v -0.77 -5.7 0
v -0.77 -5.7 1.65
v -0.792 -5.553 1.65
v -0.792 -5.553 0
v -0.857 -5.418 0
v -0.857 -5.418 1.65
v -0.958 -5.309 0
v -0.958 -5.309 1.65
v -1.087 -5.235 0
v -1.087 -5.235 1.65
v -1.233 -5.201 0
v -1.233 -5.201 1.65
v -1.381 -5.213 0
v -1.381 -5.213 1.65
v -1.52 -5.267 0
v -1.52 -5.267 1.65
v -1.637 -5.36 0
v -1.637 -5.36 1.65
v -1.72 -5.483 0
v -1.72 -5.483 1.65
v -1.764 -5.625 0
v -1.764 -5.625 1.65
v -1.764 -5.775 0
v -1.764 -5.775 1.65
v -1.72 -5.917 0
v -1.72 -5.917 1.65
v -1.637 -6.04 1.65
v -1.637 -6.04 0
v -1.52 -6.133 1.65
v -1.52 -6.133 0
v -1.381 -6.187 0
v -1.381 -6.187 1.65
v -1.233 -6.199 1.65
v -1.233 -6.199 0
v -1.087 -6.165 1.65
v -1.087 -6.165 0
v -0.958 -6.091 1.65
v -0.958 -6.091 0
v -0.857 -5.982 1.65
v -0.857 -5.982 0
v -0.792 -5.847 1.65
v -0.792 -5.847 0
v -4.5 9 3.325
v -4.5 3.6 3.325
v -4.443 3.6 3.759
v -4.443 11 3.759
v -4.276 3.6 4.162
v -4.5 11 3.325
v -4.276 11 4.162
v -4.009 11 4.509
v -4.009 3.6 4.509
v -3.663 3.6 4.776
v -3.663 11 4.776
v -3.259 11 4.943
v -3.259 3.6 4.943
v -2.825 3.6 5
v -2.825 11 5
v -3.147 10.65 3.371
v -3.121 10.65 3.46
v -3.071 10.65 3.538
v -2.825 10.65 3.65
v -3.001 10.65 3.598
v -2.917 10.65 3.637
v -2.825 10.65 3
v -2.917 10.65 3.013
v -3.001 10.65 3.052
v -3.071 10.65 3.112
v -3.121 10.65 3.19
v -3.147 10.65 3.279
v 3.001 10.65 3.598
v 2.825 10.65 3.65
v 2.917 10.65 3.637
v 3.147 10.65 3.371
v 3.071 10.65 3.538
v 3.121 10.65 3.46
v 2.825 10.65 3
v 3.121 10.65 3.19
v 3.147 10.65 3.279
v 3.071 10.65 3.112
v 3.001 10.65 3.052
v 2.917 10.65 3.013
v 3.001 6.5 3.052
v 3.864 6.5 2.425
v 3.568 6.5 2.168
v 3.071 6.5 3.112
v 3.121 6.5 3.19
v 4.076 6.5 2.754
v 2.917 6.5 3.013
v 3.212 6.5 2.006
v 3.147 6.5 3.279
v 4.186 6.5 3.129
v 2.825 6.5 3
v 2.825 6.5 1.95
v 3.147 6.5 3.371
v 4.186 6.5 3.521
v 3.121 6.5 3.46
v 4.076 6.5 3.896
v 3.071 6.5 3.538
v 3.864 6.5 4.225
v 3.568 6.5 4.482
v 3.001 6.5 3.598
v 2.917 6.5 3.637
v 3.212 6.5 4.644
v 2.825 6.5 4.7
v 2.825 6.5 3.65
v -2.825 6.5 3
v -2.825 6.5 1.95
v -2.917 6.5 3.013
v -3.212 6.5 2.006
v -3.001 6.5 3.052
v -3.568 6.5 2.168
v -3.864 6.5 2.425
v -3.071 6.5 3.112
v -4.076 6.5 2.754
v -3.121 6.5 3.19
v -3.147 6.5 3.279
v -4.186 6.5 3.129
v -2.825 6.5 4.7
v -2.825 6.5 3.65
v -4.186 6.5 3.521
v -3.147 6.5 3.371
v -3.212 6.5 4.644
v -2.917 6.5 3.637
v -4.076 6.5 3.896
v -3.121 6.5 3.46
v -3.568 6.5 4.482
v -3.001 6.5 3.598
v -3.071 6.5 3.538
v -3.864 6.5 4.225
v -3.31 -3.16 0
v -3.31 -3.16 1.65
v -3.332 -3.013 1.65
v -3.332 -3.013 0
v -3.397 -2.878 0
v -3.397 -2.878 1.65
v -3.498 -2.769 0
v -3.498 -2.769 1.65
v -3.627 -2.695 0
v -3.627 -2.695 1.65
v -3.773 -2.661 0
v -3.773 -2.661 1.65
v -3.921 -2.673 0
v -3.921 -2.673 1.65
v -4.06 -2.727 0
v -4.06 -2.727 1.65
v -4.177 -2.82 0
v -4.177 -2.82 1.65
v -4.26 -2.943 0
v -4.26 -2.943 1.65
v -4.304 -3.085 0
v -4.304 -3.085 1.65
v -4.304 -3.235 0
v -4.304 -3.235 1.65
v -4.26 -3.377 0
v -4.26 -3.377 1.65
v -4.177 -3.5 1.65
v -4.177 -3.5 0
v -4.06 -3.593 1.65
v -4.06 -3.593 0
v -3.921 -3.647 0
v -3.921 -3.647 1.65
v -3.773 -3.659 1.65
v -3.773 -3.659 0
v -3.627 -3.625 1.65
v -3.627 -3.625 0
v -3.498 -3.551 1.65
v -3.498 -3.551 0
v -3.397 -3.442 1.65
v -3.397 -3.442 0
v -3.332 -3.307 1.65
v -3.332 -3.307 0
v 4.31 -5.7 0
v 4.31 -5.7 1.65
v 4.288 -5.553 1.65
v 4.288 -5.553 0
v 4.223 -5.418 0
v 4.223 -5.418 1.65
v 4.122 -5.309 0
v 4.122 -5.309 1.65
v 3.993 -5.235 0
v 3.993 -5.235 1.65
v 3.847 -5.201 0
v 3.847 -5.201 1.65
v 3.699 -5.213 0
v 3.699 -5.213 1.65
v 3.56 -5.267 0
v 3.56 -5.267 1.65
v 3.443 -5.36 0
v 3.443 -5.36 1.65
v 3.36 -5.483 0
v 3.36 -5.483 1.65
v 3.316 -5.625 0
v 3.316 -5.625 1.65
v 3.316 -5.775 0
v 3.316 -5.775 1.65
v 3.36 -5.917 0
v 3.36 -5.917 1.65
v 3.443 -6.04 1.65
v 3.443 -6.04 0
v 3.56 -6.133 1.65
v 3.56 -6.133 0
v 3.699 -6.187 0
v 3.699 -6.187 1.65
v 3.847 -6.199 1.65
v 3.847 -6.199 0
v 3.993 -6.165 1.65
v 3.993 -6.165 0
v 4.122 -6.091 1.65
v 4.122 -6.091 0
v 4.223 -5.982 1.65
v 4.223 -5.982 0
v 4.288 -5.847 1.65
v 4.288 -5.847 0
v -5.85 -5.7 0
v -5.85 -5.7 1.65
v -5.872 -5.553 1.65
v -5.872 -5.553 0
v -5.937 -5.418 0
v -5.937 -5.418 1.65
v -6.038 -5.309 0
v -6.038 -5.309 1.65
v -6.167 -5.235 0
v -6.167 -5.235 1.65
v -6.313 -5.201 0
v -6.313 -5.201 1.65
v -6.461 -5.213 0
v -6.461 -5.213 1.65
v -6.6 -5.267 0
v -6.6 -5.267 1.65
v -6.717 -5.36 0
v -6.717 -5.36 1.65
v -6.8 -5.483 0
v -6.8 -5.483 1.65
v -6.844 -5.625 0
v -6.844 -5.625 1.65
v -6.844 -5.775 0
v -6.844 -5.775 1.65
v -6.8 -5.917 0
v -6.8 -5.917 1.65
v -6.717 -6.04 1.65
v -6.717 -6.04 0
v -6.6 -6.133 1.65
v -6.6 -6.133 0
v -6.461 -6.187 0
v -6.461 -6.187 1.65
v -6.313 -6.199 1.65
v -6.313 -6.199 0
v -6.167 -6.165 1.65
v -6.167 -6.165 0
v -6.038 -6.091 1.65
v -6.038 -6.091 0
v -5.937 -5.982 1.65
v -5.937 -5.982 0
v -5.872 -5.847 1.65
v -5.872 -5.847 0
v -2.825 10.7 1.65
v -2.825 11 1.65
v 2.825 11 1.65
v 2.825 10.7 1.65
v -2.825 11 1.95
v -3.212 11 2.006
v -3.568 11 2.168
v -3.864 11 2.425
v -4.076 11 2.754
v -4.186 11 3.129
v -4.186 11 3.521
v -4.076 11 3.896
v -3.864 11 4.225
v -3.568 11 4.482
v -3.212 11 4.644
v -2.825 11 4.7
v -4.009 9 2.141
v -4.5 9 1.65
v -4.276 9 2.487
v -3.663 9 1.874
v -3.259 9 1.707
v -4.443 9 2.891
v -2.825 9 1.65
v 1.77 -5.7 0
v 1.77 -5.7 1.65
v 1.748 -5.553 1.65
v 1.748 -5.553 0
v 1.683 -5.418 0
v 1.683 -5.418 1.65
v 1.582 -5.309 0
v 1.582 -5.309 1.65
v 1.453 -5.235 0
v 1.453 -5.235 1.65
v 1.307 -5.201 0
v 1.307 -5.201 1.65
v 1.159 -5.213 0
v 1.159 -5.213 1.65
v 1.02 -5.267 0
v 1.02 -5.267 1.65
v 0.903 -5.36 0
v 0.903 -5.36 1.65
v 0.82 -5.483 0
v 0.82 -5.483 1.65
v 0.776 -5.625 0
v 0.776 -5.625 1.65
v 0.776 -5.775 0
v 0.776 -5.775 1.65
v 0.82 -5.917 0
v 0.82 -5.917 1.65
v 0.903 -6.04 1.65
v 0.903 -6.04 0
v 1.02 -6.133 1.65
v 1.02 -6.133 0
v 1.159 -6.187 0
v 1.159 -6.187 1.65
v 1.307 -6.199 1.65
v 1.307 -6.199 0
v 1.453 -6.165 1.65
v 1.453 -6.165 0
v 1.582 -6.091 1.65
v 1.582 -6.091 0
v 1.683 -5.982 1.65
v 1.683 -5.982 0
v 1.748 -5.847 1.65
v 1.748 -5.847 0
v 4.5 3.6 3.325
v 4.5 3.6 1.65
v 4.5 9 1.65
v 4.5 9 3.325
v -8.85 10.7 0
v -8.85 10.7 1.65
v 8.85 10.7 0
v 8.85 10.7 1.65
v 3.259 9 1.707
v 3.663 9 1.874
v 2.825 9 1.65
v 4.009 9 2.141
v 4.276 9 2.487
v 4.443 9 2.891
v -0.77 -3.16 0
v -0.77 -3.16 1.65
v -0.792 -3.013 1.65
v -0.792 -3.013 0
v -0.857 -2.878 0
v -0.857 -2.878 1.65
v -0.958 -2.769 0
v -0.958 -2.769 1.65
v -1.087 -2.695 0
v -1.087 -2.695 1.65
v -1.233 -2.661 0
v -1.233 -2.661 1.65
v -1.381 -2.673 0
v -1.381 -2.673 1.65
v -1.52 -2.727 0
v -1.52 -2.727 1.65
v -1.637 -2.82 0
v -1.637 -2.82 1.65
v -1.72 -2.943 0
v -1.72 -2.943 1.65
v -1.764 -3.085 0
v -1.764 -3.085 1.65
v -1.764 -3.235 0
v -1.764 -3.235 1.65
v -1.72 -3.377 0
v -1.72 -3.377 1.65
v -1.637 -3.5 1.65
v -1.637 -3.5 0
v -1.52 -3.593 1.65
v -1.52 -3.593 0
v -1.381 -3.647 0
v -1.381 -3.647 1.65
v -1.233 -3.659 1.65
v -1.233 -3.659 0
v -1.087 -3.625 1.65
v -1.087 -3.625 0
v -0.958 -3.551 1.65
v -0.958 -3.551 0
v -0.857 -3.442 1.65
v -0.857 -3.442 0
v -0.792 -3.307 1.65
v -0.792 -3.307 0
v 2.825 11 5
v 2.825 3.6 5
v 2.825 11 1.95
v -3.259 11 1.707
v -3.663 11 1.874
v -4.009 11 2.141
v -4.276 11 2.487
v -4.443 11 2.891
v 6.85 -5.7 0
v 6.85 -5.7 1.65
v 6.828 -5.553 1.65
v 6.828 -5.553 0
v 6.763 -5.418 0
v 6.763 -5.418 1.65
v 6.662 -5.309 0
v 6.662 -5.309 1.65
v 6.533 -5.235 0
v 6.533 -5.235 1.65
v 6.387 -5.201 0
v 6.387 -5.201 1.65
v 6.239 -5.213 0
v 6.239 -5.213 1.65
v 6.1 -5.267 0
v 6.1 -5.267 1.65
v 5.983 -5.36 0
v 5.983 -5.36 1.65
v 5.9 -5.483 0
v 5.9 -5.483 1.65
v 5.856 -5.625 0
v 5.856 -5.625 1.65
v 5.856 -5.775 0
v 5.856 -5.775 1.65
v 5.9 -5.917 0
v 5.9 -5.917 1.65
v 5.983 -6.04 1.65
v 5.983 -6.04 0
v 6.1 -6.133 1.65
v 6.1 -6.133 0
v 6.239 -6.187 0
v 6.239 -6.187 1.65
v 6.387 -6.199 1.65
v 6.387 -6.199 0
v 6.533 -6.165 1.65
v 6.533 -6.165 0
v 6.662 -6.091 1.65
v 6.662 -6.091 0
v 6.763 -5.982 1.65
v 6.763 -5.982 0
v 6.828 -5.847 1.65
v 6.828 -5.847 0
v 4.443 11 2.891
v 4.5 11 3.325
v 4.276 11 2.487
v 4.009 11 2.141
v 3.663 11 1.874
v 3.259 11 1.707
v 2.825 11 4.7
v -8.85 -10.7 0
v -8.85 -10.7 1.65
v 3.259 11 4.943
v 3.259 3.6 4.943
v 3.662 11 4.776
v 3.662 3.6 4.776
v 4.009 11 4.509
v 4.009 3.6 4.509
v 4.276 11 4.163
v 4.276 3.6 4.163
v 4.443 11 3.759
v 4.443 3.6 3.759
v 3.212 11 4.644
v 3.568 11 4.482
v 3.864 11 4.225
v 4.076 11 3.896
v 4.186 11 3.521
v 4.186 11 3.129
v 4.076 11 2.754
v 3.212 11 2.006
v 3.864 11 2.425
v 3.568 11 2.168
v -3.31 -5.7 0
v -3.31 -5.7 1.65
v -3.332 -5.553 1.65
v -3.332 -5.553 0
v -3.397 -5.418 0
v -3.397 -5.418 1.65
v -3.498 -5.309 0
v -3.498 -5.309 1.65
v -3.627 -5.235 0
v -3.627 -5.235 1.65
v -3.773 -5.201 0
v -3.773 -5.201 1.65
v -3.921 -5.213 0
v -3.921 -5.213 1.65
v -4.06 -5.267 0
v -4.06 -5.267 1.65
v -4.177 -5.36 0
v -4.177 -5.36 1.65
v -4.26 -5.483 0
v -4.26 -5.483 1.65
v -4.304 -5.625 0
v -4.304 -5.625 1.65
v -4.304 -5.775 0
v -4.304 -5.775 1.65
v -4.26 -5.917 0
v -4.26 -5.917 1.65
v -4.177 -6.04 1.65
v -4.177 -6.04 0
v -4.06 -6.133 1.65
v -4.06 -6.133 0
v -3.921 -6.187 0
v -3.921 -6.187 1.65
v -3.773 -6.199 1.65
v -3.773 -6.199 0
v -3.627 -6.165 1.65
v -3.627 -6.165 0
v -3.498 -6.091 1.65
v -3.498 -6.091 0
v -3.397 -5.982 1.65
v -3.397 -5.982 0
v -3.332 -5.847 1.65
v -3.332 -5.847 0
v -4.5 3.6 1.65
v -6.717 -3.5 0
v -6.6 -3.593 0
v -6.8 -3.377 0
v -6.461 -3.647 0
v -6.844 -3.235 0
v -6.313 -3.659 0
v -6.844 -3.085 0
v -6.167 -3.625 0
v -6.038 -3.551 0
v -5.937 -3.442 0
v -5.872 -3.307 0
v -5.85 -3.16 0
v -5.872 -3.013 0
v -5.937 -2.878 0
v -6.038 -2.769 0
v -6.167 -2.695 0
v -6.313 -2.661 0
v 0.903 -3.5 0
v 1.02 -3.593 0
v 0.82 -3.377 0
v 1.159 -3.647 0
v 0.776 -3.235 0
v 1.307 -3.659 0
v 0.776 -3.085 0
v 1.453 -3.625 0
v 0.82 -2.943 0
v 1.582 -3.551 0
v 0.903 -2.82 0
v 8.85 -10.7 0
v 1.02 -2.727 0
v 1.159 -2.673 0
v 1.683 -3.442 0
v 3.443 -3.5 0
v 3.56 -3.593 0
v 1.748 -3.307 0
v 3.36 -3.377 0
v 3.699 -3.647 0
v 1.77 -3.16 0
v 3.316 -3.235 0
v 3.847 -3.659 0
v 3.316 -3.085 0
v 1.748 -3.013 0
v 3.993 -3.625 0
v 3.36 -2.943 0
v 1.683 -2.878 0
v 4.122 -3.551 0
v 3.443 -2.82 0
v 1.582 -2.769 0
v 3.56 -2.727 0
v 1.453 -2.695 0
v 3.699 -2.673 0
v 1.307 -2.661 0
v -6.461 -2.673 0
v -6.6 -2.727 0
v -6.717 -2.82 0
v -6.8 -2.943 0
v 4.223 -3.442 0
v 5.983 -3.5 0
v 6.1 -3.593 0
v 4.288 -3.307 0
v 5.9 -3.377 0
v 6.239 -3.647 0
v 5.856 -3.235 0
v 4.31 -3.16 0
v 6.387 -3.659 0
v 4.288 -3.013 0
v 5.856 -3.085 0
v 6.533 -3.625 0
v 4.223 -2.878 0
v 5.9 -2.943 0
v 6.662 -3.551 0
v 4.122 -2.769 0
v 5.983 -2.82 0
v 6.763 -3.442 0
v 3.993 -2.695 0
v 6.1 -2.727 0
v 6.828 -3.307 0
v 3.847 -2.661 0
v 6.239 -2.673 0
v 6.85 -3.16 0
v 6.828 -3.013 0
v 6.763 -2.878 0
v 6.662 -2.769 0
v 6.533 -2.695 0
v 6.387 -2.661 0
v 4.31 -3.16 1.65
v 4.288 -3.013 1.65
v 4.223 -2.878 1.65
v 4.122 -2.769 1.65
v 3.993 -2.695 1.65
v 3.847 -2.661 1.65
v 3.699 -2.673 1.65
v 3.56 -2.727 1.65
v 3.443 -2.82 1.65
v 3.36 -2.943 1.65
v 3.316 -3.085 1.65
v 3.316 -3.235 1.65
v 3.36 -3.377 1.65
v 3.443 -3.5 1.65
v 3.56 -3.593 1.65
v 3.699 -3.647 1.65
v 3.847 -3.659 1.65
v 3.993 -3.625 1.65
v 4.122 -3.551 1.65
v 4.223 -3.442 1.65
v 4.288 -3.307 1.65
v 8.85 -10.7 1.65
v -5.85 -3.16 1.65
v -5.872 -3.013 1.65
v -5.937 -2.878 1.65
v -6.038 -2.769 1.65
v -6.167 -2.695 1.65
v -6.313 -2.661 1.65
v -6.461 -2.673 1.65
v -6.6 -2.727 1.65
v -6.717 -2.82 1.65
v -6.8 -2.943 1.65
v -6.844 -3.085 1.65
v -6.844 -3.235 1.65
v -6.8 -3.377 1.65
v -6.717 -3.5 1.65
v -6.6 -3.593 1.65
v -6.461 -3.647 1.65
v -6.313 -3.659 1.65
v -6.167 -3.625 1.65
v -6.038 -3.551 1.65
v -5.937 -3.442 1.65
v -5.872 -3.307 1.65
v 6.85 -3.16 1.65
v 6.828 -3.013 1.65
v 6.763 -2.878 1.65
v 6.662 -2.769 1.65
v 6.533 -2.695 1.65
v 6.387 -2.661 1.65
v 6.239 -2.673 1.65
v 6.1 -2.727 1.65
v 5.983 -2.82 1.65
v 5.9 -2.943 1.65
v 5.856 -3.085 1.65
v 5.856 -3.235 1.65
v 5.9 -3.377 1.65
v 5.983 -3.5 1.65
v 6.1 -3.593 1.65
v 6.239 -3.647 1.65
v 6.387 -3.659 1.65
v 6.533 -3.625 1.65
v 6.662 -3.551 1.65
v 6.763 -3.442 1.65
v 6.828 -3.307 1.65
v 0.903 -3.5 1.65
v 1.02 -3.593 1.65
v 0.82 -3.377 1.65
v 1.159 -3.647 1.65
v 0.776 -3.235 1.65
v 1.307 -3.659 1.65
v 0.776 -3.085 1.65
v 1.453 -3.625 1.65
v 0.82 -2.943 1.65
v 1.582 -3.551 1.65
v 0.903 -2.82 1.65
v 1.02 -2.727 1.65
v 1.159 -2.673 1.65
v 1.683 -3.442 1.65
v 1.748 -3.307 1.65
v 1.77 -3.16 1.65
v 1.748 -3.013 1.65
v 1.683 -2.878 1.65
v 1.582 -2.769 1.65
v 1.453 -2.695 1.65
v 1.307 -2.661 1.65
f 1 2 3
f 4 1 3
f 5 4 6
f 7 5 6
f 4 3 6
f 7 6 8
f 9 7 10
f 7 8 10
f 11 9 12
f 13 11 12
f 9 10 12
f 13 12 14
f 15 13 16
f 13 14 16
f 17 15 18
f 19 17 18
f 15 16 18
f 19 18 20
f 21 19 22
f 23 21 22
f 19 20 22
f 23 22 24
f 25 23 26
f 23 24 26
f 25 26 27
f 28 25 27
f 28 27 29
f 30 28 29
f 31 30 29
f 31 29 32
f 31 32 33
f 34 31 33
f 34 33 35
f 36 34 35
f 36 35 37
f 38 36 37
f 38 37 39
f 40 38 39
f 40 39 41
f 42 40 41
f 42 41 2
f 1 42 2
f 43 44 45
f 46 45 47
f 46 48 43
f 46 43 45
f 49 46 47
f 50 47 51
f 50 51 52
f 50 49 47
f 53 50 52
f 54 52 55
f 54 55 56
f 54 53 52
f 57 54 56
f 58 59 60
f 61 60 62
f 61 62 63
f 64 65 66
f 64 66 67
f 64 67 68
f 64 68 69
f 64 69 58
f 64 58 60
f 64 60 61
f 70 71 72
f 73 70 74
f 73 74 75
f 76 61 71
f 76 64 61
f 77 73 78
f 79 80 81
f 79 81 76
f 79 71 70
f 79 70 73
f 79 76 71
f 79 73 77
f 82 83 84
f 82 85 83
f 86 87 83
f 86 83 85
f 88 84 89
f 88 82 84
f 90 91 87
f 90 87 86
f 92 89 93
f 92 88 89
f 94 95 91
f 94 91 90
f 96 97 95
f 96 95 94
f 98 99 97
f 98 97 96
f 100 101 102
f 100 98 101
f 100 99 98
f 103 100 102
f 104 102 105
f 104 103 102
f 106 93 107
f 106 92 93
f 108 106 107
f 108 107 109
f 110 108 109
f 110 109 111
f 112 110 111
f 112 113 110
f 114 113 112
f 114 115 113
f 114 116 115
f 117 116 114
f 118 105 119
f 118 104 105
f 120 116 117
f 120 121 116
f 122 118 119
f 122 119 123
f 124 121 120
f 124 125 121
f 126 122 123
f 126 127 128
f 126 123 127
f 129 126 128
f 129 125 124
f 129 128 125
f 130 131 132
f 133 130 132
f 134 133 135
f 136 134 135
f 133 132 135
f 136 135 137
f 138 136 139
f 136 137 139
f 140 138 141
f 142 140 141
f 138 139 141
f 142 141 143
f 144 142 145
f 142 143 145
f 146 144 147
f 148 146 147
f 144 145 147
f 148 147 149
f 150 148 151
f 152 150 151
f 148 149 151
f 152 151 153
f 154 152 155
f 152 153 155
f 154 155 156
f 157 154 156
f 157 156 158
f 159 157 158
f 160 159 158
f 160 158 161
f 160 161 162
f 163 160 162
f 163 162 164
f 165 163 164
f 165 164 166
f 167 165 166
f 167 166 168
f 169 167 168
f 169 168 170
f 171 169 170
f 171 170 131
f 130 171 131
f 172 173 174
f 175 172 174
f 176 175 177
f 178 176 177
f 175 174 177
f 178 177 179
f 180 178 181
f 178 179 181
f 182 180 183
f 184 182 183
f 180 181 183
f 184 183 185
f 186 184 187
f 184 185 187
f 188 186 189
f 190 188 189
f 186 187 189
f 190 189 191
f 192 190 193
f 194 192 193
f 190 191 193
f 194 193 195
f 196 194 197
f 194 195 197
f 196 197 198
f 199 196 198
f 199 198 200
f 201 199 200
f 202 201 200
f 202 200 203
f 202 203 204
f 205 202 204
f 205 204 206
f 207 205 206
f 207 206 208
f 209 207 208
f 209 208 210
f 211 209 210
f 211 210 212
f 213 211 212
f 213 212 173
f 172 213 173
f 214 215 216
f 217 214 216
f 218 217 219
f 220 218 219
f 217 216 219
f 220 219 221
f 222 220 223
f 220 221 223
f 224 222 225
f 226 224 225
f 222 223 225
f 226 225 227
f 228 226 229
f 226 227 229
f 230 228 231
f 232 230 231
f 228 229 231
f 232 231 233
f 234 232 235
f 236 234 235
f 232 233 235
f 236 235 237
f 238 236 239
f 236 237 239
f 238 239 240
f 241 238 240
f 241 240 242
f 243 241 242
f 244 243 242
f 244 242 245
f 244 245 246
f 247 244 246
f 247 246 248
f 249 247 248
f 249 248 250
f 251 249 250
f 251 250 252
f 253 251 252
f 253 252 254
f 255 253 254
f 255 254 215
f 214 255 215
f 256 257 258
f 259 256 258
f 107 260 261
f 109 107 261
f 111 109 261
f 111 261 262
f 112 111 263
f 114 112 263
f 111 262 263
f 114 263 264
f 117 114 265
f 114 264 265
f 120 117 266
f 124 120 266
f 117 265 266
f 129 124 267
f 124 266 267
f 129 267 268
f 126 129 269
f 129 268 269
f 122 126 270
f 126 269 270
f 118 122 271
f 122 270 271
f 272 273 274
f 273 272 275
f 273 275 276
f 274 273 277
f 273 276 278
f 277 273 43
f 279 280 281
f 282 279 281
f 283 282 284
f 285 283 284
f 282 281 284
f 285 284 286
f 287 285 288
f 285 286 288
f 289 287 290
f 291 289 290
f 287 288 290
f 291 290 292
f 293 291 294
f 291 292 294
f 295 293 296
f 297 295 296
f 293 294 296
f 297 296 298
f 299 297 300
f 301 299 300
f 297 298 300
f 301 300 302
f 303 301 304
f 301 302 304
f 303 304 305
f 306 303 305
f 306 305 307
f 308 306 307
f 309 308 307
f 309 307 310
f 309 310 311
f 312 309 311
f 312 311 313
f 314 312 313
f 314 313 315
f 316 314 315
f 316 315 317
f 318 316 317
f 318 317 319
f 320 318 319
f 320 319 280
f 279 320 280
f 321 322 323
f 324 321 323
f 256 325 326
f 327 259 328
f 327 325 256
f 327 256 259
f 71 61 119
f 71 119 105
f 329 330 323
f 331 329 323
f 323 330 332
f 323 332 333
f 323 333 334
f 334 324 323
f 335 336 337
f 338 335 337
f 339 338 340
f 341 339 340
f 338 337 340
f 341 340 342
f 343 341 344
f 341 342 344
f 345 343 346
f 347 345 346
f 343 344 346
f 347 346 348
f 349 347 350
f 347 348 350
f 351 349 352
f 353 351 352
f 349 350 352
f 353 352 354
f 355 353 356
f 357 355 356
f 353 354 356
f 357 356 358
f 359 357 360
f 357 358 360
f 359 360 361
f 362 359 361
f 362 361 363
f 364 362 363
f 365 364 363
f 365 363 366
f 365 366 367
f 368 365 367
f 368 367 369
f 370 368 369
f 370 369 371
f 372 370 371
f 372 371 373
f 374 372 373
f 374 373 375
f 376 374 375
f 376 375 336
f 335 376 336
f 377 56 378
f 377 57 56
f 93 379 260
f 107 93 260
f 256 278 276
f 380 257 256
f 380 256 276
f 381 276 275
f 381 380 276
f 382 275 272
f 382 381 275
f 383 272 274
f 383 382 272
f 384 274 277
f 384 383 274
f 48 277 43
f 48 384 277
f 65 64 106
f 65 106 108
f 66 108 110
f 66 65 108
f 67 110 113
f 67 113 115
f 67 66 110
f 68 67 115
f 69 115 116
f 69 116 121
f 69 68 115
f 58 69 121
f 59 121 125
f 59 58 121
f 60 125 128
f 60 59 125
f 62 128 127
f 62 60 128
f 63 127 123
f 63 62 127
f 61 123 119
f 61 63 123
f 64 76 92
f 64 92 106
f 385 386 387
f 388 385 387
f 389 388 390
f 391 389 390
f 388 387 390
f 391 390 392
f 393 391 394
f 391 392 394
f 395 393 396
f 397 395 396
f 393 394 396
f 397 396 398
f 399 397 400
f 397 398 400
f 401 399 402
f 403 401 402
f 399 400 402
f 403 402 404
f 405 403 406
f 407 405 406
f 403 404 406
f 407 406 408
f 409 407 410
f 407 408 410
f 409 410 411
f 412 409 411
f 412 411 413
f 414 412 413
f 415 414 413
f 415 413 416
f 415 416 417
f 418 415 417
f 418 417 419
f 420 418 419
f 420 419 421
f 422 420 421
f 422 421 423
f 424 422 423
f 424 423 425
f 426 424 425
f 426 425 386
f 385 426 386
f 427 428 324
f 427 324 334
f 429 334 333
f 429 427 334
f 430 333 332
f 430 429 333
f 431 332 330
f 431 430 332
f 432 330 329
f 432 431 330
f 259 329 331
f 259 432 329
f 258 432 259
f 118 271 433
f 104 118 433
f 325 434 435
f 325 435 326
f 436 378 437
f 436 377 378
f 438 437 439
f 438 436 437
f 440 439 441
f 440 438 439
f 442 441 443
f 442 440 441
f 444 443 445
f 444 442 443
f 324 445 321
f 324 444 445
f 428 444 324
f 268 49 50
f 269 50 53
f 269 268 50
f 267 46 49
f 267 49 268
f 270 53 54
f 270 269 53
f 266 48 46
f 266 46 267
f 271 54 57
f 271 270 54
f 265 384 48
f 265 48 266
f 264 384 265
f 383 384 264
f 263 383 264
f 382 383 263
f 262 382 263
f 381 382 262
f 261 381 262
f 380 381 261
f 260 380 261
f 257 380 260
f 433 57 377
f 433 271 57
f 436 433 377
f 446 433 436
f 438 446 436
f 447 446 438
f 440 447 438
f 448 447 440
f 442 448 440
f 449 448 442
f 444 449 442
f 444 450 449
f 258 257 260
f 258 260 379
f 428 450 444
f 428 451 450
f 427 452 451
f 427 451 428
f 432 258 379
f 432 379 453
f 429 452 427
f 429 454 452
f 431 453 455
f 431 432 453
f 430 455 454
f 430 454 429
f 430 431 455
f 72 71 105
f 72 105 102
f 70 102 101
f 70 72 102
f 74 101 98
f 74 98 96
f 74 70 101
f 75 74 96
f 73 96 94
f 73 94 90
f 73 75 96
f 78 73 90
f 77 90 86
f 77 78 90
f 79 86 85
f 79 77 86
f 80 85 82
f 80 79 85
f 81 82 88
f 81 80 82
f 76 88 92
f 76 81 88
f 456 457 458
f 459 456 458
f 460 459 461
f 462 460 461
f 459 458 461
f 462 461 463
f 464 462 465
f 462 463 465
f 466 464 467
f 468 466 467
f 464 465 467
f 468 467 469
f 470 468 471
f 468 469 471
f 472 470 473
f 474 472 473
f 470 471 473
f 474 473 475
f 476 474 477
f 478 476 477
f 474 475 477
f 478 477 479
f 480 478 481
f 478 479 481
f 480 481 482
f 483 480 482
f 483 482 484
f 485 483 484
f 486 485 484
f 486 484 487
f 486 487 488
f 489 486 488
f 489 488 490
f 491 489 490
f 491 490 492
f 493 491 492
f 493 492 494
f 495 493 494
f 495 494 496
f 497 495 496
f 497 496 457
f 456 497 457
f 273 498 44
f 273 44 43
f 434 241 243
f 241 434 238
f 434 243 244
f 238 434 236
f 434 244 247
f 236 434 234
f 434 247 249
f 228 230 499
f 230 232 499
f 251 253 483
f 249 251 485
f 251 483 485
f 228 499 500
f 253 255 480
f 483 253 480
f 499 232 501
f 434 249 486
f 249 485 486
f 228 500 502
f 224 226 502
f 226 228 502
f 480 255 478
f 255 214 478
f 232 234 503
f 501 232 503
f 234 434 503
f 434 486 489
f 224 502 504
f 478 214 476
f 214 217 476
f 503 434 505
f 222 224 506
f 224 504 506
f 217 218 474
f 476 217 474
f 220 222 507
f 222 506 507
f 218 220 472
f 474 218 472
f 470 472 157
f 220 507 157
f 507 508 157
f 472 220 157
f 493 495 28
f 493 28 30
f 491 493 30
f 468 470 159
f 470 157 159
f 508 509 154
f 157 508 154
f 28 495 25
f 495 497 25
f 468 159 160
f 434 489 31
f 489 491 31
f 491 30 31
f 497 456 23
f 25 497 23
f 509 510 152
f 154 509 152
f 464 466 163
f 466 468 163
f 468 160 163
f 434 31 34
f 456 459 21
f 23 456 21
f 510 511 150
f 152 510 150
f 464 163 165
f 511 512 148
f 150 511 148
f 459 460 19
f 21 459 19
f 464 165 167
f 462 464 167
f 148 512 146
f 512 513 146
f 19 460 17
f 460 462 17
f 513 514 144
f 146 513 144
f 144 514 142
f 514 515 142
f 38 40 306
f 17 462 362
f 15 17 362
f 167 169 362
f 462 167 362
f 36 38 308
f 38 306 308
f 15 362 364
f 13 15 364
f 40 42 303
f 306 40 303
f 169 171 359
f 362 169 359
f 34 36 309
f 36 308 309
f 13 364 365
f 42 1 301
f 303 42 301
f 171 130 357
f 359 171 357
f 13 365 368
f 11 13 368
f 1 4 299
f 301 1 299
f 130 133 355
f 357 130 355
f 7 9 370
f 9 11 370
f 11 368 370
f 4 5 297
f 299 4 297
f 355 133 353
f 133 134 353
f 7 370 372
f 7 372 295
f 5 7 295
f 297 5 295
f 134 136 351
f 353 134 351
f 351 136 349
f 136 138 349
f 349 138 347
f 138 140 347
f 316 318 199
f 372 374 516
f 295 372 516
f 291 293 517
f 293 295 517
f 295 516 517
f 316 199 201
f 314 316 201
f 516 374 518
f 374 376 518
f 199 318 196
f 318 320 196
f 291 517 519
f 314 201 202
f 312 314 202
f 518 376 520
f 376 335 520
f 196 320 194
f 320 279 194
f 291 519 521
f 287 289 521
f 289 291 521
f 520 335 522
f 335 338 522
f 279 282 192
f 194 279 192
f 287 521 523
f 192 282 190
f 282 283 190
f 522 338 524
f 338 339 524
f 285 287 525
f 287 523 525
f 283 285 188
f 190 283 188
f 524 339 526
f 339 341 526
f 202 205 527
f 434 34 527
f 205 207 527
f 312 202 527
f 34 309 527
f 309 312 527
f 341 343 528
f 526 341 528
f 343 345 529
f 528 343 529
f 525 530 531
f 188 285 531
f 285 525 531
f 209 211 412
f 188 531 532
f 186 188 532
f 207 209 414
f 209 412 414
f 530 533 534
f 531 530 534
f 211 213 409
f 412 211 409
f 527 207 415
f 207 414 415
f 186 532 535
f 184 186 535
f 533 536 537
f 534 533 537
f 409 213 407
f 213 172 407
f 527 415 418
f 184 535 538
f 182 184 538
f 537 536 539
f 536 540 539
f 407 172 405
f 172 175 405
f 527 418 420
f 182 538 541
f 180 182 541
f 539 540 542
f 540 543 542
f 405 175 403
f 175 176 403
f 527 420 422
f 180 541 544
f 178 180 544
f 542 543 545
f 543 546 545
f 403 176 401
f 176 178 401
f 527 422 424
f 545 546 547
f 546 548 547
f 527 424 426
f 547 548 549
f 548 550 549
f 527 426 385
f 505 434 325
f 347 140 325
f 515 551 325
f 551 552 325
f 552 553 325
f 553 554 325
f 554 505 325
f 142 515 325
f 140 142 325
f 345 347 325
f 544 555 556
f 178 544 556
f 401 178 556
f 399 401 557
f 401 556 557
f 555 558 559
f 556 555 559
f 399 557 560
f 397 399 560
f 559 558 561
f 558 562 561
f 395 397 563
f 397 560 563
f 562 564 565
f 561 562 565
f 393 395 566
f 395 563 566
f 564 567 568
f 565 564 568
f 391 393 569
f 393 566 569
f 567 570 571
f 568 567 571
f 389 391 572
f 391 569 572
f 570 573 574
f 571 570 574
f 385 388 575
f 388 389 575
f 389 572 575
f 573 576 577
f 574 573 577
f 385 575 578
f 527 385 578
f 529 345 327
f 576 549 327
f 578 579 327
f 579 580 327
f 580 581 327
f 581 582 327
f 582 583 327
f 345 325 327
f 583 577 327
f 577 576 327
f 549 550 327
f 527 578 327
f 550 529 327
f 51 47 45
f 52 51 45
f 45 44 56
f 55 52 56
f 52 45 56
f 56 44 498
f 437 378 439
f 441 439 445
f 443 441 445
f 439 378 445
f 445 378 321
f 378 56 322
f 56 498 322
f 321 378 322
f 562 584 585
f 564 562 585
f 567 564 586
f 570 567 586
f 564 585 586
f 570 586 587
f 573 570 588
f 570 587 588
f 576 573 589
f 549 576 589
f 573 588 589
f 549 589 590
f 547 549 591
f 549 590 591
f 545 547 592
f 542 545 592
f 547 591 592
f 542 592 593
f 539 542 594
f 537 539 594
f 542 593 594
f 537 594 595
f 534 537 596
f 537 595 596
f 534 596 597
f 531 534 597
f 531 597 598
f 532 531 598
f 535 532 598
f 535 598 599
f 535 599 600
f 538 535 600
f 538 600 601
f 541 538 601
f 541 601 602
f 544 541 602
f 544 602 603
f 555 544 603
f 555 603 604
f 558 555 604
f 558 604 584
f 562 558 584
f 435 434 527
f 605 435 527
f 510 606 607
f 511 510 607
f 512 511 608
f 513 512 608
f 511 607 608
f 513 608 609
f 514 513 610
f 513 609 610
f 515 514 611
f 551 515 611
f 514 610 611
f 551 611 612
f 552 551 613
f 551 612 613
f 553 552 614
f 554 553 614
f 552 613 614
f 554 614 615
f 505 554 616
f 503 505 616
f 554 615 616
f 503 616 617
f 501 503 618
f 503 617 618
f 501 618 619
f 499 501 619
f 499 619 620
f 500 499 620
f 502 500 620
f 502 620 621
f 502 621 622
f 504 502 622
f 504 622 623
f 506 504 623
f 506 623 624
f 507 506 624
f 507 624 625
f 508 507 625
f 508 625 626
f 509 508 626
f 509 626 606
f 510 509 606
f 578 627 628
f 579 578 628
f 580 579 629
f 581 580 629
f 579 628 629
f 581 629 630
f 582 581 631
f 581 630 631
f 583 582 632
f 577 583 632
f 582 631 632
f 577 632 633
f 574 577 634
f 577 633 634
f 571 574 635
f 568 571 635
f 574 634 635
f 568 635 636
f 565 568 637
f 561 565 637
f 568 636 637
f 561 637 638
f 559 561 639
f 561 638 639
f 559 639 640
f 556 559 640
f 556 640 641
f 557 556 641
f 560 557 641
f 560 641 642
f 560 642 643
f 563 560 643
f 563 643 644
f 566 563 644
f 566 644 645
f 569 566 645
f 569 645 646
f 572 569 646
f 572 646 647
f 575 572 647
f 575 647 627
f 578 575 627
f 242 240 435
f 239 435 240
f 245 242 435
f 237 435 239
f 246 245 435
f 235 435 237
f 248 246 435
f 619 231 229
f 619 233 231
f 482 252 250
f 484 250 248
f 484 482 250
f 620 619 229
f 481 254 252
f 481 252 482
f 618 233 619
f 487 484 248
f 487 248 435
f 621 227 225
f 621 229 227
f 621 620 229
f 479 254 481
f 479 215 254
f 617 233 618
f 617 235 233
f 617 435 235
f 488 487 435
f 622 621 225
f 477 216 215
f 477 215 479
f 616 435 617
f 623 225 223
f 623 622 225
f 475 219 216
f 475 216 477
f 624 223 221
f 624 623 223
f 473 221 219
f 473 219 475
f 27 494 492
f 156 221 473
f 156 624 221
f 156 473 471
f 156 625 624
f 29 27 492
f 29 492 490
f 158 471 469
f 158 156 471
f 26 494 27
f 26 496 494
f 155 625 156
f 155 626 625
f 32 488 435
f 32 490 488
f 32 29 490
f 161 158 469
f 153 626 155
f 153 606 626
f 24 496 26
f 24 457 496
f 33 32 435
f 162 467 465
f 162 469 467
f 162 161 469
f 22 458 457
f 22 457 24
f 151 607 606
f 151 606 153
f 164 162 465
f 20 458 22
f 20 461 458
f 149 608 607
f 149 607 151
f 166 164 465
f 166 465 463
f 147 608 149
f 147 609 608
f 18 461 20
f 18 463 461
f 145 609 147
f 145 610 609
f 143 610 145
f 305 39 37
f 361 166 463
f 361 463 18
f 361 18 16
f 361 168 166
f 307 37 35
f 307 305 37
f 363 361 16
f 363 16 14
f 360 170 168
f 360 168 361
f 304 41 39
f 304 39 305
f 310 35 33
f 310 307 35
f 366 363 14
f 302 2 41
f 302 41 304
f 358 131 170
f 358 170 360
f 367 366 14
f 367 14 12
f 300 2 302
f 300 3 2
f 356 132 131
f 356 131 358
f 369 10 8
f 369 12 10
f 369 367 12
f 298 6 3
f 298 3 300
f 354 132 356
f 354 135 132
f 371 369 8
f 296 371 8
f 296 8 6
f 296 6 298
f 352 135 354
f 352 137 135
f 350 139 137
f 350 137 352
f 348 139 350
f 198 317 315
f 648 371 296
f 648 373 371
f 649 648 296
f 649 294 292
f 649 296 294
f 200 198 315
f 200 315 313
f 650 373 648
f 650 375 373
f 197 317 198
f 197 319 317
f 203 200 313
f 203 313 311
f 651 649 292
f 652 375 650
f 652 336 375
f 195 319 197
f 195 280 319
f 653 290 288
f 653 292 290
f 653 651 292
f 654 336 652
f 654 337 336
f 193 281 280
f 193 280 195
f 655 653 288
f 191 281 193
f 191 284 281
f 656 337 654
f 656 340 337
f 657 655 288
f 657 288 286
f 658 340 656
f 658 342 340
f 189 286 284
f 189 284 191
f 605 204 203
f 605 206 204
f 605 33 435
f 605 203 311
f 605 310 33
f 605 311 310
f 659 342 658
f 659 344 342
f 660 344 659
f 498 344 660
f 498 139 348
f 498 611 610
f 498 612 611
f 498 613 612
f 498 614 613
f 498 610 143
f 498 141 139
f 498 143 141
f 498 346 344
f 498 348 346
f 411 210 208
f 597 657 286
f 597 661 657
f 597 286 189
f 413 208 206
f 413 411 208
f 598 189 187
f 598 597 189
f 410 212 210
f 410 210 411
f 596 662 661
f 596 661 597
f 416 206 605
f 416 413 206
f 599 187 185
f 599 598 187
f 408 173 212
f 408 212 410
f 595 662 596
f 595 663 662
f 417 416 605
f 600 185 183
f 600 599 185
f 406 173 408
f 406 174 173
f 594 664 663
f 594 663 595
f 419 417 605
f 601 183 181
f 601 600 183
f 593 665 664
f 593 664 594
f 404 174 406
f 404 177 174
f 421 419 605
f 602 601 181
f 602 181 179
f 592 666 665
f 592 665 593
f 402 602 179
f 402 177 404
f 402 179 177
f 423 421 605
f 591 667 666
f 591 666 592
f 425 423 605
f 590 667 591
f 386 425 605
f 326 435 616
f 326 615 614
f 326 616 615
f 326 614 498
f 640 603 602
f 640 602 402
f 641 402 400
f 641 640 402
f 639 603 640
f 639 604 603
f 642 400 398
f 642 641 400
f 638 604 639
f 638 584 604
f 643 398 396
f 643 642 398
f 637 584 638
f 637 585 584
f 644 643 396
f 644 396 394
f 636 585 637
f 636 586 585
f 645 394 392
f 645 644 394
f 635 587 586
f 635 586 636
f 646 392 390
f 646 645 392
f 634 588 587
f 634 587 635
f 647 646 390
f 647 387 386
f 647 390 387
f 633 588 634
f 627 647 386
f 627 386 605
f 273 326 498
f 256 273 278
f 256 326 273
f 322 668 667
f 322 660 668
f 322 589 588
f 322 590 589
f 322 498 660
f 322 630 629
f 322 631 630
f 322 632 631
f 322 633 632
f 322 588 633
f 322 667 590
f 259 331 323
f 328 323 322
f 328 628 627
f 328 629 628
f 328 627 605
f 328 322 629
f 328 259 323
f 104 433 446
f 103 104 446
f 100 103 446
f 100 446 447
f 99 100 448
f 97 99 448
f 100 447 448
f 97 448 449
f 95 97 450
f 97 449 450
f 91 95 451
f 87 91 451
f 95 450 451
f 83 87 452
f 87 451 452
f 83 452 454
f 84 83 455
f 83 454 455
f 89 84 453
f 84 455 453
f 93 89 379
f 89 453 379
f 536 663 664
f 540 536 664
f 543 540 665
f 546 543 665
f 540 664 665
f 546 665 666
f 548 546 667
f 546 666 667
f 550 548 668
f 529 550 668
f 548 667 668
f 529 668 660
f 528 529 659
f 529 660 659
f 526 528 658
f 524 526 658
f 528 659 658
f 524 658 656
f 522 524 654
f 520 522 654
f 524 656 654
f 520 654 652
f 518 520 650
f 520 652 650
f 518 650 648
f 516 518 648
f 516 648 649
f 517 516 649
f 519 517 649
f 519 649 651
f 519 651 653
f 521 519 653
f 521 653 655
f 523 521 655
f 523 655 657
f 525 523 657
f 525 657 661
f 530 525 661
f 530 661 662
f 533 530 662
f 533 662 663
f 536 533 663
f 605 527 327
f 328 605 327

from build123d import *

# Parameters (mm, degrees)
SKETCH_W        = 17.7
SKETCH_H        = 21.4
PAD_DEPTH       = 1.65
SKETCH001_W     = 9
SKETCH001_H     = 7.4
PAD001_DEPTH    = 3.35
SKETCH002_R     = 0.5
POCKET_DEPTH    = 1.651
FILLET_R        = 1.675
POCKET001_DEPTH = 2
POCKET002_DEPTH = 4.5
POCKET003_DEPTH = 0.35


with BuildPart() as part:
    # Sketch → Pad (new body)
    with BuildSketch(Plane.XY):
        Rectangle(SKETCH_W, SKETCH_H)
    extrude(amount=PAD_DEPTH)

    # Sketch001 (on Face6 of Pad) → Pad001 (join)
    with BuildSketch(Plane.XY.offset(1.65)):
        with Locations((0, 7.3)):
            Rectangle(SKETCH001_W, SKETCH001_H)
    extrude(amount=PAD001_DEPTH)

    # Sketch002 (on Face5 of Pad001) → Pocket (cut, through all)
    with BuildSketch(Plane.XY.offset(1.65)):
        with Locations((-6.35, -3.16)):
            Circle(SKETCH002_R)
        with Locations((-3.81, -3.16)):
            Circle(SKETCH002_R)
        with Locations((-1.27, -3.16)):
            Circle(SKETCH002_R)
        with Locations((1.27, -3.16)):
            Circle(SKETCH002_R)
        with Locations((3.81, -3.16)):
            Circle(SKETCH002_R)
        with Locations((6.35, -3.16)):
            Circle(SKETCH002_R)
        with Locations((-6.35, -5.7)):
            Circle(SKETCH002_R)
        with Locations((-3.81, -5.7)):
            Circle(SKETCH002_R)
        with Locations((-1.27, -5.7)):
            Circle(SKETCH002_R)
        with Locations((1.27, -5.7)):
            Circle(SKETCH002_R)
        with Locations((3.81, -5.7)):
            Circle(SKETCH002_R)
        with Locations((6.35, -5.7)):
            Circle(SKETCH002_R)
    extrude(amount=-POCKET_DEPTH, mode=Mode.SUBTRACT)

    # Fillet
    fillet_edges = [part.edges().sort_by_distance(p)[0] for p in [
        (-4.5, 7.3, 5),
        (4.5, 7.3, 5),
    ]]
    fillet(fillet_edges, radius=FILLET_R)

    # Sketch003 (on Face5 of Fillet) → Pocket001 (cut)
    with BuildSketch(Plane(origin=(0, 11, 0), x_dir=(-1, 0, 0), z_dir=(0, 1, 0))):
        with BuildLine():
            ThreePointArc((-4.5, 3.325), (-4.009404, 2.140596), (-2.825, 1.65))
            Line((-2.825, 1.65), (-4.5, 1.65))
            Line((-4.5, 3.325), (-4.5, 1.65))
        make_face()
        with BuildLine():
            ThreePointArc((2.825, 1.65), (4.009404, 2.140596), (4.5, 3.325))
            Line((4.5, 3.325), (4.5, 1.65))
            Line((2.825, 1.65), (4.5, 1.65))
        make_face()
    extrude(amount=-POCKET001_DEPTH, mode=Mode.SUBTRACT)

    # Sketch004 (on Face6 of Pocket001) → Pocket002 (cut)
    with BuildSketch(Plane(origin=(0, 11, 0), x_dir=(-1, 0, 0), z_dir=(0, 1, 0))):
        with BuildLine():
            ThreePointArc((-2.825, 4.7), (-4.2, 3.325), (-2.825, 1.95))
            Line((-2.825, 1.95), (2.825, 1.95))
            ThreePointArc((2.825, 1.95), (4.2, 3.325), (2.825, 4.7))
            Line((2.825, 4.7), (-2.825, 4.7))
        make_face()
        with BuildLine():
            ThreePointArc((-2.825, 3.65), (-3.15, 3.325), (-2.825, 3))
            Line((-2.825, 3), (2.825, 3))
            ThreePointArc((2.825, 3), (3.15, 3.325), (2.825, 3.65))
            Line((2.825, 3.65), (-2.825, 3.65))
        make_face(mode=Mode.SUBTRACT)
    extrude(amount=-POCKET002_DEPTH, mode=Mode.SUBTRACT)

    # Pocket002 Face38 → Pocket003 (cut)
    with BuildSketch(Plane(origin=(0, 11, 3.325), x_dir=(1, 0, 0), z_dir=(0, 1, 0))):
        with BuildLine():
            Line((-2.825, -0.325), (2.825, -0.325))
            ThreePointArc((2.825, -0.325), (3.15, 0), (2.825, 0.325))
            Line((2.825, 0.325), (-2.825, 0.325))
            ThreePointArc((-2.825, 0.325), (-3.15, 0), (-2.825, -0.325))
        make_face()
    extrude(amount=-POCKET003_DEPTH, mode=Mode.SUBTRACT)


solid = part.part
